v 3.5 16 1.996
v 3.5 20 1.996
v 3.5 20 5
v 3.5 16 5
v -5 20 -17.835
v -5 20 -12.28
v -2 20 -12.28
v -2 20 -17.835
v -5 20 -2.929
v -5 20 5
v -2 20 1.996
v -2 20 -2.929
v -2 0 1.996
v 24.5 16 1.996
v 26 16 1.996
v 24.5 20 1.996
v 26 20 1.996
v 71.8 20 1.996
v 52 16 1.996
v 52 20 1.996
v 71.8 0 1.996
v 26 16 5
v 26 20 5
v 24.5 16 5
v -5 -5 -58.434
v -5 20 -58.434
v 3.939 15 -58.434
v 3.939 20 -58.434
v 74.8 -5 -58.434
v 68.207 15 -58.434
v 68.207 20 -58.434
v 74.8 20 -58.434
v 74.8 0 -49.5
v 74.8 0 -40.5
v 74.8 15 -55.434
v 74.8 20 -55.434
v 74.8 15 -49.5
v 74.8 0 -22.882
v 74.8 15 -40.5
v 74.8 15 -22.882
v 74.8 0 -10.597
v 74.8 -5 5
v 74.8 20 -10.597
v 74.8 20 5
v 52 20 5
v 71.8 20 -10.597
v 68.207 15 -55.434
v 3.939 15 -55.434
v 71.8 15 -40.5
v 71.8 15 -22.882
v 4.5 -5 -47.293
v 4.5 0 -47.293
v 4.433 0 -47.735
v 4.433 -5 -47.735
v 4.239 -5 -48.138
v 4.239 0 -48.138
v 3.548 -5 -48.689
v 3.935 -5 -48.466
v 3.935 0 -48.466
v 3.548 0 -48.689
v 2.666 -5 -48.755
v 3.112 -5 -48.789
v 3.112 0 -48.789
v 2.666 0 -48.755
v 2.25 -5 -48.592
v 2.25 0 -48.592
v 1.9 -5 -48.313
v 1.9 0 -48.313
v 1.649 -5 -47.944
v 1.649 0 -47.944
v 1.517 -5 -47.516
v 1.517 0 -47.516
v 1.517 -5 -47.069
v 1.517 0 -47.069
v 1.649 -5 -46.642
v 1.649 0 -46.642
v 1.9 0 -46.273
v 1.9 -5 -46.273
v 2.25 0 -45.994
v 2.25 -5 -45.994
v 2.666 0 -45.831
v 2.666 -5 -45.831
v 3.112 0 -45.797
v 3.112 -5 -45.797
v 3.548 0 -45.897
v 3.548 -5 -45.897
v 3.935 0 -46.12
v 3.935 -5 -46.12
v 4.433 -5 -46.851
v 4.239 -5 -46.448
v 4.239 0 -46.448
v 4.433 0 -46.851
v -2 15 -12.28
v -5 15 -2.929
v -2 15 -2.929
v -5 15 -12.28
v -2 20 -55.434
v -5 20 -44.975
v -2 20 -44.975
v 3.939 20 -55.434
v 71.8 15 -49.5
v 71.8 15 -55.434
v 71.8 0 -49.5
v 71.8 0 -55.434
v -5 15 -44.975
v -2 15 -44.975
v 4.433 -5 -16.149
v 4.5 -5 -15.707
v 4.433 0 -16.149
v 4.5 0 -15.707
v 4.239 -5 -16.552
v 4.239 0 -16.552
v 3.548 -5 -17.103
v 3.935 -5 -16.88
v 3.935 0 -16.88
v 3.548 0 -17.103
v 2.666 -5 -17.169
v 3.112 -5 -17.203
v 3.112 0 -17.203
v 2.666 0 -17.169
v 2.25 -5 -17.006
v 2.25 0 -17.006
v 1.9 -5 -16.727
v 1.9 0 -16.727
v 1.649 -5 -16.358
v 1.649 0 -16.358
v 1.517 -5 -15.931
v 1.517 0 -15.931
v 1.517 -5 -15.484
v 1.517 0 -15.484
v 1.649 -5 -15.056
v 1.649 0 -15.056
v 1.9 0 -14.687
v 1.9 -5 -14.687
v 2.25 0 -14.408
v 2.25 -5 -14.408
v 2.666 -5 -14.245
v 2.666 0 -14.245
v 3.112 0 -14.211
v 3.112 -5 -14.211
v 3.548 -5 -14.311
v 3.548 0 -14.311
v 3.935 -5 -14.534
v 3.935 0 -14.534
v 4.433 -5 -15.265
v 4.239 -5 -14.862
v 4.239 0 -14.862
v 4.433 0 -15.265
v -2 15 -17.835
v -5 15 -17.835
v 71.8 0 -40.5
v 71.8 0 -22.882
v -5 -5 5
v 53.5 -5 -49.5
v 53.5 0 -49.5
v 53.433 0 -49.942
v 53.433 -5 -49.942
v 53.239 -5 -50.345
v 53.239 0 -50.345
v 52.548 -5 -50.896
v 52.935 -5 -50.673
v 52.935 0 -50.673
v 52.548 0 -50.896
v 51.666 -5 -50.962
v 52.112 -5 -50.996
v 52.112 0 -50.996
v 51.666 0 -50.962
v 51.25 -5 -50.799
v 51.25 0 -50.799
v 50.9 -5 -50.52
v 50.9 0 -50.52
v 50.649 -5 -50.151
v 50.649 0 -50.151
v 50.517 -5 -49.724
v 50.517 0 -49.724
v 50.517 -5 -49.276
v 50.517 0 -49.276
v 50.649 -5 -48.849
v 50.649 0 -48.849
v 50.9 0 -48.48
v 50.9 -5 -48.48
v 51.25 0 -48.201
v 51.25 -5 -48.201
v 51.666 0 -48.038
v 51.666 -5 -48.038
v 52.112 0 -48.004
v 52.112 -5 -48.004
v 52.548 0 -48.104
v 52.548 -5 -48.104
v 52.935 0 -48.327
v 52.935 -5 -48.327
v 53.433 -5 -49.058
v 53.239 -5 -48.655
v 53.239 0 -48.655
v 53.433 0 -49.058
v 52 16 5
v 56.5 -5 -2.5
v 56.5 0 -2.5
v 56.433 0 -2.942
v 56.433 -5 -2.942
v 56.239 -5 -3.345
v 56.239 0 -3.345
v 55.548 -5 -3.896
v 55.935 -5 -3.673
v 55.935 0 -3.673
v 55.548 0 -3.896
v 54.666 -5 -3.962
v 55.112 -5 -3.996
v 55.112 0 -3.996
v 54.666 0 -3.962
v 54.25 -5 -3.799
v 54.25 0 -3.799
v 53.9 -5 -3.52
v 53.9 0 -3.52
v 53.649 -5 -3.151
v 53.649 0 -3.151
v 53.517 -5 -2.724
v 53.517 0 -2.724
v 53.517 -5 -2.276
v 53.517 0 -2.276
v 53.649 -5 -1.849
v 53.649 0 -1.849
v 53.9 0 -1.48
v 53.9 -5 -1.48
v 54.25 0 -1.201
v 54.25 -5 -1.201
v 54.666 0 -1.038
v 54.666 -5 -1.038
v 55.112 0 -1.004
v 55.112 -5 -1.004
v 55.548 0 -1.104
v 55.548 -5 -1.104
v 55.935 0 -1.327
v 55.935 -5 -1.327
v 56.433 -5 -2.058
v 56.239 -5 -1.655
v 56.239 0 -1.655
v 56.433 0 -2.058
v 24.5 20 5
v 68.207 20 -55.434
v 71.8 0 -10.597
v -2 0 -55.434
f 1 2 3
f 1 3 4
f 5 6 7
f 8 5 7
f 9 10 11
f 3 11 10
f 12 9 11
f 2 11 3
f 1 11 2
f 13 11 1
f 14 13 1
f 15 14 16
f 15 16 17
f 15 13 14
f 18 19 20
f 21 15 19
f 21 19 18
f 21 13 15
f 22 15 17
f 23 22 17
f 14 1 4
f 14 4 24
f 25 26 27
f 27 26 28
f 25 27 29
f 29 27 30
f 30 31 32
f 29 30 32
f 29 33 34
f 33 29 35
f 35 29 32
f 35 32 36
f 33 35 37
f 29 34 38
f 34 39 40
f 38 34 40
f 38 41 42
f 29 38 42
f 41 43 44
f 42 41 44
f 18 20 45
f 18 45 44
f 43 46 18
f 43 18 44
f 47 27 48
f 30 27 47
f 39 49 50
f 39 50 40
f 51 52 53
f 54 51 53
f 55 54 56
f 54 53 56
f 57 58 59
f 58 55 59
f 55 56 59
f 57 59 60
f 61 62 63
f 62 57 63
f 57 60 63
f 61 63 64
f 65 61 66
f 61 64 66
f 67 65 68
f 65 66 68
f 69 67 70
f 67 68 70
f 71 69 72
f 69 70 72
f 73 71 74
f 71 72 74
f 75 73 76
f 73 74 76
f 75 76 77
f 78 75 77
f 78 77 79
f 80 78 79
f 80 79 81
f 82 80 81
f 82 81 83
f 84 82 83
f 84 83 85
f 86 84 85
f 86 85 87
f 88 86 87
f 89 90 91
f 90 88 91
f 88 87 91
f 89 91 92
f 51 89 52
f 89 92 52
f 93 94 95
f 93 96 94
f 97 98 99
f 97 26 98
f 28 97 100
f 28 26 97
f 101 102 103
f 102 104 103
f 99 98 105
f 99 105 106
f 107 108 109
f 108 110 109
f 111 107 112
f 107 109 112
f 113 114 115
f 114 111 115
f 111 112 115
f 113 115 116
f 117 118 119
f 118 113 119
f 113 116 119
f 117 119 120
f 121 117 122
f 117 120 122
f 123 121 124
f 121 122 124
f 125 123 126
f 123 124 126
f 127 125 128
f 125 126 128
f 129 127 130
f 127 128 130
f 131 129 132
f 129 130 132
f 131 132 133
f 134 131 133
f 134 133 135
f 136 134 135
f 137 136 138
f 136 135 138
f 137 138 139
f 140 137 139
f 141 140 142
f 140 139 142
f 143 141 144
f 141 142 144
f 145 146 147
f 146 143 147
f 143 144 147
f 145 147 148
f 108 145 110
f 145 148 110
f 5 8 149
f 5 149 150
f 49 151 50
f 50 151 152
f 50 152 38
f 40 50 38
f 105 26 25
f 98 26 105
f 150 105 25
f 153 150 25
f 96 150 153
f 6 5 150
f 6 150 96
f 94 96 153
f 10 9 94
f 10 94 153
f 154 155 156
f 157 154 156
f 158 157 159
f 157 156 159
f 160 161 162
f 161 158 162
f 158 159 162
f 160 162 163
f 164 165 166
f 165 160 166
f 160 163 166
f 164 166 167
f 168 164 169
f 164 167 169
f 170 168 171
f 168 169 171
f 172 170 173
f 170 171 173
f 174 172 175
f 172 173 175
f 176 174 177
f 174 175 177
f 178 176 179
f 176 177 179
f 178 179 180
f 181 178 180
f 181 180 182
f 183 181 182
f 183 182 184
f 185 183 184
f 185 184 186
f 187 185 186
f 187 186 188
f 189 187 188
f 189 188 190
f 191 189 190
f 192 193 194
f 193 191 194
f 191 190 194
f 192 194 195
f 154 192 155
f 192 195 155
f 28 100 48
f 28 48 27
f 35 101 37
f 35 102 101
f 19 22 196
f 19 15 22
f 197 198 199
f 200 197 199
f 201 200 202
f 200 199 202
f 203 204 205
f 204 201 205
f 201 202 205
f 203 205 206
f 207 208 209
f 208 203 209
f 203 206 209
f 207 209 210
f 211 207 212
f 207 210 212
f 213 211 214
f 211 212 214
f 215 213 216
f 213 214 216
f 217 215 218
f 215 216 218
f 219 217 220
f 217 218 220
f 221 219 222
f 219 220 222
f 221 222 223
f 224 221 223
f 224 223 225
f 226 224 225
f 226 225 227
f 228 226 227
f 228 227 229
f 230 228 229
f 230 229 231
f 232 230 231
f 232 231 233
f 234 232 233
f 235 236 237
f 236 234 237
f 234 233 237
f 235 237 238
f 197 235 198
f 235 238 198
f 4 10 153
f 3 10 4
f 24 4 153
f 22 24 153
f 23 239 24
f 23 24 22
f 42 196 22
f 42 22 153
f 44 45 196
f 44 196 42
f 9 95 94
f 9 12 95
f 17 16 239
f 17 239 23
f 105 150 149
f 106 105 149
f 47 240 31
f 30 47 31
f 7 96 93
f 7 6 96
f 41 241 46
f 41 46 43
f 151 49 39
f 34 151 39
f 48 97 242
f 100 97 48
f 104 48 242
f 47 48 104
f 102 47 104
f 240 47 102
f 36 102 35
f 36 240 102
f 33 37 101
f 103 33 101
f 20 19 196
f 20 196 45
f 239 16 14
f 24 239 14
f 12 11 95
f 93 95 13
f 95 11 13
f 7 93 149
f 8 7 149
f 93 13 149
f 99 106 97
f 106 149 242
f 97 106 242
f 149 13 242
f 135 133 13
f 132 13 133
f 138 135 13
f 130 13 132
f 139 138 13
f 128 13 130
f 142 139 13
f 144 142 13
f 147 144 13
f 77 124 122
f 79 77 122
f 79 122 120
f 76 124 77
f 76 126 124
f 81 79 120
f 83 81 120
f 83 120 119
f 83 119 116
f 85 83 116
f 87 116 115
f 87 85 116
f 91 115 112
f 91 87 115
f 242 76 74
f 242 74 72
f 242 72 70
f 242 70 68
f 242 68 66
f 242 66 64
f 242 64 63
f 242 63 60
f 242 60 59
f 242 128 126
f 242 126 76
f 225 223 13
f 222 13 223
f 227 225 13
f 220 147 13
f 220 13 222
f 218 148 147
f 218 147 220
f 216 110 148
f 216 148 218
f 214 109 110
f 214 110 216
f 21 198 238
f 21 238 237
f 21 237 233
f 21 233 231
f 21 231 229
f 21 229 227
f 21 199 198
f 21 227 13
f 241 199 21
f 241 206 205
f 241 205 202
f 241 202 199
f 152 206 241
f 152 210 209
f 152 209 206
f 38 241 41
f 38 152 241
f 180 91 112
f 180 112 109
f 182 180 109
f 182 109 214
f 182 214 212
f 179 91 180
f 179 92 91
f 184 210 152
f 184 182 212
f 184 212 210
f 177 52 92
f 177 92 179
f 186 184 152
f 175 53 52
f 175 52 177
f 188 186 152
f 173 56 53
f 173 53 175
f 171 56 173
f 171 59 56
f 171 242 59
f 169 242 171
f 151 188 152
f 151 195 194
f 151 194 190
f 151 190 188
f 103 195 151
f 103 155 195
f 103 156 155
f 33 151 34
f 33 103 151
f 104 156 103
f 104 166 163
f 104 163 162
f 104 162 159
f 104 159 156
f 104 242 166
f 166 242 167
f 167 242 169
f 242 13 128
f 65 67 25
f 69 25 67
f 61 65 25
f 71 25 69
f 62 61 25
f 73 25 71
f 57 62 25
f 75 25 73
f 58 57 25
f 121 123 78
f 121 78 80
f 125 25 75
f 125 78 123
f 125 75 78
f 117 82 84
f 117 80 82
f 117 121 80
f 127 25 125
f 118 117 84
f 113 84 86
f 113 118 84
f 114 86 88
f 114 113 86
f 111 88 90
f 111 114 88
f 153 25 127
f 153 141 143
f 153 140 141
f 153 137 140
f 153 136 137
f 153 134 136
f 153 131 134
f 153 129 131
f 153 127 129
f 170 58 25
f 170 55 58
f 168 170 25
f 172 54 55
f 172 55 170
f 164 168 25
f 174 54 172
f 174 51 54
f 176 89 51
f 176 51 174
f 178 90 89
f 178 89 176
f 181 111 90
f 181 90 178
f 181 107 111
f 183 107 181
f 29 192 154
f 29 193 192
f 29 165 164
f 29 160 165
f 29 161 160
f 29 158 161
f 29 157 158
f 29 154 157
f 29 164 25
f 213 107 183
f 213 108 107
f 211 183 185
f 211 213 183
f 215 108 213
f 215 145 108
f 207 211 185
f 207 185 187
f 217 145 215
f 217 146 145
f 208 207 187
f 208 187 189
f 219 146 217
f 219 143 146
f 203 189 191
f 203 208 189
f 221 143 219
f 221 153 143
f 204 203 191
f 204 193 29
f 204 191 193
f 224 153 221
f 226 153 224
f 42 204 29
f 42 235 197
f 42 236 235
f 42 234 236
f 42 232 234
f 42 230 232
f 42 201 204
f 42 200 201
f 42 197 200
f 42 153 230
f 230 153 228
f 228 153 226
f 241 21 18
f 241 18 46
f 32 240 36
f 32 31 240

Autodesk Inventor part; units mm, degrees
ref_plane "YZ Plane" through (0, 0, 0) normal (1, 0, 0) x (0, 1, 0)
ref_plane "XZ Plane" through (0, 0, 0) normal (0, 1, 0) x (-1, 0, 0)
ref_plane "XY Plane" through (0, 0, 0) normal (0, 0, 1) x (1, 0, 0)
ref_plane "Work Plane2" through (0, 0, 0) normal (0, -1, 0) x (1, 0, 0)
sketch "Sketch33" plane through (0, 0, 0) normal (0, -1, 0) x (1, 0, 0)
  line L0 (74.8, -53.4338) -> (0, -53.4338)
  line L1 (0, -53.4338) -> (0, 0)
  line L2 (0, 0) -> (74.8, 0)
  line L3 (74.8, 0) -> (74.8, -53.4338)
  line L4 (74.8, -53.4338) -> (0, -53.4338)
  line L5 (0, -53.4338) -> (0, 0)
  line L6 (0, 0) -> (74.8, 0)
  line L7 (74.8, 0) -> (74.8, -53.4338)
  circle A0 centre (52, -49.5) radius 1.5 projected
  circle A1 centre (52, -49.5) radius 1.5
  circle A2 centre (3, -47.2929) radius 1.5 projected
  circle A3 centre (3, -47.2929) radius 1.5
  circle A4 centre (3, -15.7071) radius 1.5 projected
  circle A5 centre (3, -15.7071) radius 1.5
  circle A6 centre (55, -2.5) radius 1.5 projected
  circle A7 centre (55, -2.5) radius 1.5
  line L8 (74.8, -53.4338) -> (0, -53.4338)
  line L9 (0, -53.4338) -> (0, -58.4338)
  line L10 (0, -58.4338) -> (74.8, -58.4338)
  line L11 (74.8, -58.4338) -> (74.8, -53.4338)
  line L12 (0, -58.4338) -> (-5, -58.4338)
  line L13 (-5, -58.4338) -> (-5, -53.4338)
  line L14 (-5, -53.4338) -> (0, -53.4338)
  line L15 (0, -53.4338) -> (0, -58.4338)
  line L16 (0, 0) -> (-5, 0)
  line L17 (-5, 0) -> (-5, -53.4338)
  line L18 (-5, -53.4338) -> (0, -53.4338)
  line L19 (0, -53.4338) -> (0, 0)
  line L20 (-5, 0) -> (0, 0)
  line L21 (0, 0) -> (0, 5)
  line L22 (0, 5) -> (-5, 5)
  line L23 (-5, 5) -> (-5, 0)
  line L24 (0, 5) -> (74.8, 5)
  line L25 (74.8, 5) -> (74.8, 0)
  line L26 (74.8, 0) -> (0, 0)
  line L27 (0, 0) -> (0, 5)
  line L28 (74.8, -53.4338) -> (69.8, -53.4338)
  line L29 (69.8, -53.4338) -> (69.8, 5)
  line L30 (69.8, 5) -> (74.8, 5)
  line L31 (74.8, 5) -> (74.8, -53.4338)
  point P0 (74.8, 0)
  dimension "d220" = 5
  dimension "d221" = 5
  dimension "d222" = 5
  dimension "d223" = 5
extrude "Extrusion32" add sketch "Sketch33" along normal blind 5
ref_plane "Work Plane16" through (0, 0, 0) normal (0, 1, 0) x (1, 0, 0)
sketch "Sketch38" plane through (0, 0, 0) normal (0, 1, 0) x (1, 0, 0)
  line L0 (74.8, -5) -> (-5, -5) projected
  line L1 (-5, 58.4338) -> (74.8, 58.4338) projected
  line L2 (-5, -5) -> (-2, -5)
  line L3 (-2, -5) -> (-2, 58.4338)
  line L4 (-2, 58.4338) -> (-5, 58.4338)
  line L5 (-5, 58.4338) -> (-5, -5)
  line L6 (-5, -5) -> (-5, 58.4338) projected
  line L7 (74.8, 58.4338) -> (74.8, -5) projected
  line L8 (-5, 58.4338) -> (74.8, 58.4338)
  line L9 (74.8, 58.4338) -> (74.8, 55.4338)
  line L10 (74.8, 55.4338) -> (-5, 55.4338)
  line L11 (-5, 55.4338) -> (-5, 58.4338)
  line L12 (74.8, 58.4338) -> (71.8, 58.4338)
  line L13 (71.8, 58.4338) -> (71.8, 22.8825)
  line L14 (71.8, 22.8825) -> (74.8, 22.8825)
  line L15 (74.8, 22.8825) -> (74.8, 58.4338)
  line L16 (74.8, -5) -> (71.8, -5)
  line L17 (71.8, -5) -> (71.8, 10.5966)
  line L18 (71.8, 10.5966) -> (74.8, 10.5966)
  line L19 (74.8, 10.5966) -> (74.8, -5)
  line L20 (74.8, -5) -> (-5, -5)
  line L21 (-5, -5) -> (-5, -1.9965)
  line L22 (-5, -1.9965) -> (74.8, -1.9965)
  line L23 (74.8, -1.9965) -> (74.8, -5)
  point P0 (0, 0)
  point P1 (71.8, -1.9965)
  point P2 (-2, -1.9965)
  point P3 (-2, 55.4338)
  point P4 (71.8, 55.4338)
  dimension "d231" = 3
  dimension "d232" = 3
  dimension "d233" = 3
extrude "Extrusion33" add sketch "Sketch38" along normal blind 20 contours L0 L17 L22 L7 | L0 L3 L22 L17 | L22 L17 L18 L7 | L0 L5 L22 L3 | L22 L5 L10 L3 | L14 L13 L10 L7 | L10 L5 L1 L3 | L3 L1 L13 L10 | L10 L13 L1 L7
ref_plane "Work Plane11" through (71.8, 0, 1.9965) normal (0, 0, -1) x (-1, 0, 0)
sketch "Sketch45" plane through (71.8, 0, 1.9965) normal (0, 0, -1) x (-1, 0, 0)
  line L0 (47.3, 2) -> (47.3, 11) projected
  line L1 (73.8, 0) -> (0, 0) projected
  line L2 (47.3, 11) -> (45.8, 11)
  line L3 (45.8, 11) -> (45.8, 0)
  line L4 (45.8, 0) -> (47.3, 0)
  line L5 (47.3, 0) -> (47.3, 11)
  line L6 (47.3, 11) -> (45.8, 11)
  line L7 (45.8, 11) -> (45.8, 20.3018)
  line L8 (45.8, 20.3018) -> (47.3, 20.3018)
  line L9 (47.3, 20.3018) -> (47.3, 11)
  line L10 (68.3, 11) -> (47.3, 11) projected
  line L11 (47.3, 20.3018) -> (68.3, 20.3018)
  line L12 (68.3, 20.3018) -> (68.3, 11)
  line L13 (68.3, 11) -> (47.3, 11)
  line L14 (47.3, 11) -> (47.3, 20.3018)
  line L15 (45.8, 11) -> (19.8, 11)
  line L16 (19.8, 11) -> (19.8, 20.3018)
  line L17 (19.8, 20.3018) -> (45.8, 20.3018)
  line L18 (45.8, 20.3018) -> (45.8, 11)
  point P0 (71.8, 0)
  dimension "d243" = 1.5
  dimension "d244" = 26
extrude "Extrusion37" cut sketch "Sketch45" against normal blind 10 contours L9 L11 L12 L10 | L15 L16 L17 L7
ref_plane "Work Plane10" through (0, 20, 0) normal (0, 1, 0) x (1, 0, 0)
sketch "Sketch46" plane through (0, 20, 0) normal (0, 1, 0) x (1, 0, 0)
  line L0 (-2, 55.4338) -> (71.8, 55.4338) projected
  line L1 (75.7583, 22.3753) -> (69.7041, 22.3753)
  line L2 (69.7041, 22.3753) -> (69.7041, 55.4338)
  line L3 (69.7041, 55.4338) -> (75.7583, 55.4338)
  line L4 (75.7583, 55.4338) -> (75.7583, 22.3753)
  point P0 (0, 0)
extrude "Extrusion38" cut sketch "Sketch46" against normal blind 5
ref_plane "Work Plane14" through (0, 15, 0) normal (0, 1, 0) x (1, 0, 0)
sketch "Sketch47" plane through (0, 15, 0) normal (0, 1, 0) x (1, 0, 0)
  line L0 (70.1, 40.5) -> (70.1, 49.5) projected
  line L1 (70.1, 40.5) -> (76.1155, 40.5)
  line L2 (76.1155, 40.5) -> (76.1155, 49.5)
  line L3 (76.1155, 49.5) -> (70.1, 49.5)
  line L4 (70.1, 49.5) -> (70.1, 40.5)
  point P0 (0, 0)
  dimension "d249" = 9
extrude "Extrusion39" cut sketch "Sketch47" against normal blind 15
ref_plane "Work Plane9" through (0, 20, 0) normal (0, 1, 0) x (1, 0, 0)
sketch "Sketch48" plane through (0, 20, 0) normal (0, 1, 0) x (1, 0, 0)
  line L0 (74.8, 58.4338) -> (-5, 58.4338) projected
  line L1 (68.5228, 52.4259) -> (68.2069, 52.4259)
  line L2 (68.2069, 52.4259) -> (68.2069, 58.4338)
  line L3 (68.2069, 58.4338) -> (68.5228, 58.4338)
  line L4 (68.5228, 58.4338) -> (68.5228, 52.4259)
  line L5 (68.2069, 58.4338) -> (68.5228, 58.4338)
  line L6 (68.5228, 58.4338) -> (68.5228, 53.4262)
  line L7 (68.5228, 53.4262) -> (68.2069, 53.4262)
  line L8 (68.2069, 53.4262) -> (68.2069, 58.4338)
  line L9 (-2, 55.4338) -> (74.8, 55.4338) projected
  line L10 (68.5228, 55.4338) -> (50.5228, 55.4338)
  line L11 (50.5228, 55.4338) -> (50.5228, 58.4338)
  line L12 (50.5228, 58.4338) -> (68.5228, 58.4338)
  line L13 (68.5228, 58.4338) -> (68.5228, 55.4338)
  line L14 (51.9394, 55.4338) -> (3.9394, 55.4338)
  line L15 (3.9394, 55.4338) -> (3.9394, 58.4338)
  line L16 (3.9394, 58.4338) -> (51.9394, 58.4338)
  line L17 (51.9394, 58.4338) -> (51.9394, 55.4338)
  line L18 (-5, 58.4338) -> (-5, -5) projected
  line L19 (-5, 44.9754) -> (3.9394, 44.9754)
  line L20 (3.9394, 44.9754) -> (3.9394, 17.8349)
  line L21 (3.9394, 17.8349) -> (-5, 17.8349)
  line L22 (-5, 17.8349) -> (-5, 44.9754)
  line L23 (-5, 12.2802) -> (-0.5303, 12.2802)
  line L24 (-0.5303, 12.2802) -> (-0.5303, 2.9287)
  line L25 (-0.5303, 2.9287) -> (-5, 2.9287)
  line L26 (-5, 2.9287) -> (-5, 12.2802)
  point P0 (0, 0)
  point P1 (68.2069, 55.4338)
  dimension "d252" = 18
  dimension "d253" = 48
ref_plane "Work Plane8" through (0, 20, 0) normal (0, 1, 0) x (1, 0, 0)
sketch "Sketch49" plane through (0, 20, 0) normal (0, 1, 0) x (1, 0, 0)
  line L0 (74.8, 58.4338) -> (-5, 58.4338) projected
  line L1 (-2, 55.4338) -> (74.8, 55.4338) projected
  line L2 (50.5217, 58.4338) -> (3.9392, 58.4338)
  line L3 (3.9392, 58.4338) -> (3.9392, 55.4338)
  line L4 (3.9392, 55.4338) -> (50.5217, 55.4338)
  line L5 (50.5217, 55.4338) -> (50.5217, 58.4338)
  point P0 (0, 0)
extrude "Extrusion40" cut sketch "Sketch48" against normal blind 5 contours L23 L24 L25 L18 | L19 L20 L21 L18 | L2 L9 L17 L0 | L17 L9 L11 L0 | L11 L9 L15 L0
ref_plane "Work Plane13" through (26, 11, 1.9965) normal (0, 1, 0) x (1, 0, 0)
sketch "Sketch50" plane through (26, 11, 1.9965) normal (0, 1, 0) x (1, 0, 0)
  line L0 (-1.5, 0) -> (-1.5, -3.0035) projected
  line L1 (-31, -3.0035) -> (-22.5, -3.0035) projected
  line L2 (-1.5, 0) -> (-22.5, 0)
  line L3 (-22.5, 0) -> (-22.5, -3.0035)
  line L4 (-22.5, -3.0035) -> (-1.5, -3.0035)
  line L5 (-1.5, -3.0035) -> (-1.5, 0)
  line L6 (0, 0) -> (0, -3.0035) projected
  line L7 (26, 0) -> (26, -3.0035) projected
  line L8 (0, -3.0035) -> (26, -3.0035)
  line L9 (26, -3.0035) -> (26, 0)
  line L10 (26, 0) -> (0, 0)
  line L11 (0, 0) -> (0, -3.0035)
  point P0 (-26, 1.9965)
  point P1 (26, -3.0035)
extrude "Extrusion41" add sketch "Sketch50" along normal blind 5
sketch "Sketch51" plane through (0, 20, 0) normal (0, 1, 0) x (1, 0, 0)
  point P0 (0, 0)
sketch "Sketch52" plane through (0, 20, 0) normal (0, 1, 0) x (1, 0, 0)
  line L0 (3.9394, 58.4338) -> (-5, 58.4338) projected
  line L1 (-5, -5) -> (3.5, -5) projected
  line L2 (74.8, 55.4338) -> (74.8, 49.5) projected
  line L3 (-5, 58.4338) -> (-5, 44.9754) projected
  line L4 (74.8, 55.4338) -> (74.8, 58.4338) projected
  line L5 (68.2069, 58.4338) -> (68.2069, 55.4338) projected
  line L6 (74.8, -5) -> (74.8, 10.5966) projected
  line L7 (52, -1.9965) -> (52, -5) projected
  line L8 (52, -5) -> (74.8, -5) projected
  line L9 (71.8, -1.9965) -> (52, -1.9965) projected
  line L10 (71.8, 10.5966) -> (71.8, -1.9965) projected
  line L11 (26, -5) -> (26, -1.9965) projected
  line L12 (24.5, -1.9965) -> (24.5, -5) projected
  line L13 (3.5, -5) -> (3.5, -1.9965) projected
  line L14 (-5, 12.2802) -> (-2, 12.2802) projected
  line L15 (-2, 2.9287) -> (-5, 2.9287) projected
  point P0 (0, 0)
  dimension "d258" = 63.4338
  dimension "d259" = 79.8
  dimension "d260" = 6.5931
  dimension "d261" = 3
  dimension "d262" = 22.8
  dimension "d263" = 3.0035
  dimension "d264" = 3
  dimension "d265" = 12.593
  dimension "d266" = 15.5966
  dimension "d267" = 19.8
  dimension "d268" = 26
  dimension "d269" = 21
  dimension "d270" = 8.5
  dimension "d271" = 9.3515
  dimension "d272" = 13.4584
  dimension "d273" = 8.9394
properties part number "_3DPrint"
